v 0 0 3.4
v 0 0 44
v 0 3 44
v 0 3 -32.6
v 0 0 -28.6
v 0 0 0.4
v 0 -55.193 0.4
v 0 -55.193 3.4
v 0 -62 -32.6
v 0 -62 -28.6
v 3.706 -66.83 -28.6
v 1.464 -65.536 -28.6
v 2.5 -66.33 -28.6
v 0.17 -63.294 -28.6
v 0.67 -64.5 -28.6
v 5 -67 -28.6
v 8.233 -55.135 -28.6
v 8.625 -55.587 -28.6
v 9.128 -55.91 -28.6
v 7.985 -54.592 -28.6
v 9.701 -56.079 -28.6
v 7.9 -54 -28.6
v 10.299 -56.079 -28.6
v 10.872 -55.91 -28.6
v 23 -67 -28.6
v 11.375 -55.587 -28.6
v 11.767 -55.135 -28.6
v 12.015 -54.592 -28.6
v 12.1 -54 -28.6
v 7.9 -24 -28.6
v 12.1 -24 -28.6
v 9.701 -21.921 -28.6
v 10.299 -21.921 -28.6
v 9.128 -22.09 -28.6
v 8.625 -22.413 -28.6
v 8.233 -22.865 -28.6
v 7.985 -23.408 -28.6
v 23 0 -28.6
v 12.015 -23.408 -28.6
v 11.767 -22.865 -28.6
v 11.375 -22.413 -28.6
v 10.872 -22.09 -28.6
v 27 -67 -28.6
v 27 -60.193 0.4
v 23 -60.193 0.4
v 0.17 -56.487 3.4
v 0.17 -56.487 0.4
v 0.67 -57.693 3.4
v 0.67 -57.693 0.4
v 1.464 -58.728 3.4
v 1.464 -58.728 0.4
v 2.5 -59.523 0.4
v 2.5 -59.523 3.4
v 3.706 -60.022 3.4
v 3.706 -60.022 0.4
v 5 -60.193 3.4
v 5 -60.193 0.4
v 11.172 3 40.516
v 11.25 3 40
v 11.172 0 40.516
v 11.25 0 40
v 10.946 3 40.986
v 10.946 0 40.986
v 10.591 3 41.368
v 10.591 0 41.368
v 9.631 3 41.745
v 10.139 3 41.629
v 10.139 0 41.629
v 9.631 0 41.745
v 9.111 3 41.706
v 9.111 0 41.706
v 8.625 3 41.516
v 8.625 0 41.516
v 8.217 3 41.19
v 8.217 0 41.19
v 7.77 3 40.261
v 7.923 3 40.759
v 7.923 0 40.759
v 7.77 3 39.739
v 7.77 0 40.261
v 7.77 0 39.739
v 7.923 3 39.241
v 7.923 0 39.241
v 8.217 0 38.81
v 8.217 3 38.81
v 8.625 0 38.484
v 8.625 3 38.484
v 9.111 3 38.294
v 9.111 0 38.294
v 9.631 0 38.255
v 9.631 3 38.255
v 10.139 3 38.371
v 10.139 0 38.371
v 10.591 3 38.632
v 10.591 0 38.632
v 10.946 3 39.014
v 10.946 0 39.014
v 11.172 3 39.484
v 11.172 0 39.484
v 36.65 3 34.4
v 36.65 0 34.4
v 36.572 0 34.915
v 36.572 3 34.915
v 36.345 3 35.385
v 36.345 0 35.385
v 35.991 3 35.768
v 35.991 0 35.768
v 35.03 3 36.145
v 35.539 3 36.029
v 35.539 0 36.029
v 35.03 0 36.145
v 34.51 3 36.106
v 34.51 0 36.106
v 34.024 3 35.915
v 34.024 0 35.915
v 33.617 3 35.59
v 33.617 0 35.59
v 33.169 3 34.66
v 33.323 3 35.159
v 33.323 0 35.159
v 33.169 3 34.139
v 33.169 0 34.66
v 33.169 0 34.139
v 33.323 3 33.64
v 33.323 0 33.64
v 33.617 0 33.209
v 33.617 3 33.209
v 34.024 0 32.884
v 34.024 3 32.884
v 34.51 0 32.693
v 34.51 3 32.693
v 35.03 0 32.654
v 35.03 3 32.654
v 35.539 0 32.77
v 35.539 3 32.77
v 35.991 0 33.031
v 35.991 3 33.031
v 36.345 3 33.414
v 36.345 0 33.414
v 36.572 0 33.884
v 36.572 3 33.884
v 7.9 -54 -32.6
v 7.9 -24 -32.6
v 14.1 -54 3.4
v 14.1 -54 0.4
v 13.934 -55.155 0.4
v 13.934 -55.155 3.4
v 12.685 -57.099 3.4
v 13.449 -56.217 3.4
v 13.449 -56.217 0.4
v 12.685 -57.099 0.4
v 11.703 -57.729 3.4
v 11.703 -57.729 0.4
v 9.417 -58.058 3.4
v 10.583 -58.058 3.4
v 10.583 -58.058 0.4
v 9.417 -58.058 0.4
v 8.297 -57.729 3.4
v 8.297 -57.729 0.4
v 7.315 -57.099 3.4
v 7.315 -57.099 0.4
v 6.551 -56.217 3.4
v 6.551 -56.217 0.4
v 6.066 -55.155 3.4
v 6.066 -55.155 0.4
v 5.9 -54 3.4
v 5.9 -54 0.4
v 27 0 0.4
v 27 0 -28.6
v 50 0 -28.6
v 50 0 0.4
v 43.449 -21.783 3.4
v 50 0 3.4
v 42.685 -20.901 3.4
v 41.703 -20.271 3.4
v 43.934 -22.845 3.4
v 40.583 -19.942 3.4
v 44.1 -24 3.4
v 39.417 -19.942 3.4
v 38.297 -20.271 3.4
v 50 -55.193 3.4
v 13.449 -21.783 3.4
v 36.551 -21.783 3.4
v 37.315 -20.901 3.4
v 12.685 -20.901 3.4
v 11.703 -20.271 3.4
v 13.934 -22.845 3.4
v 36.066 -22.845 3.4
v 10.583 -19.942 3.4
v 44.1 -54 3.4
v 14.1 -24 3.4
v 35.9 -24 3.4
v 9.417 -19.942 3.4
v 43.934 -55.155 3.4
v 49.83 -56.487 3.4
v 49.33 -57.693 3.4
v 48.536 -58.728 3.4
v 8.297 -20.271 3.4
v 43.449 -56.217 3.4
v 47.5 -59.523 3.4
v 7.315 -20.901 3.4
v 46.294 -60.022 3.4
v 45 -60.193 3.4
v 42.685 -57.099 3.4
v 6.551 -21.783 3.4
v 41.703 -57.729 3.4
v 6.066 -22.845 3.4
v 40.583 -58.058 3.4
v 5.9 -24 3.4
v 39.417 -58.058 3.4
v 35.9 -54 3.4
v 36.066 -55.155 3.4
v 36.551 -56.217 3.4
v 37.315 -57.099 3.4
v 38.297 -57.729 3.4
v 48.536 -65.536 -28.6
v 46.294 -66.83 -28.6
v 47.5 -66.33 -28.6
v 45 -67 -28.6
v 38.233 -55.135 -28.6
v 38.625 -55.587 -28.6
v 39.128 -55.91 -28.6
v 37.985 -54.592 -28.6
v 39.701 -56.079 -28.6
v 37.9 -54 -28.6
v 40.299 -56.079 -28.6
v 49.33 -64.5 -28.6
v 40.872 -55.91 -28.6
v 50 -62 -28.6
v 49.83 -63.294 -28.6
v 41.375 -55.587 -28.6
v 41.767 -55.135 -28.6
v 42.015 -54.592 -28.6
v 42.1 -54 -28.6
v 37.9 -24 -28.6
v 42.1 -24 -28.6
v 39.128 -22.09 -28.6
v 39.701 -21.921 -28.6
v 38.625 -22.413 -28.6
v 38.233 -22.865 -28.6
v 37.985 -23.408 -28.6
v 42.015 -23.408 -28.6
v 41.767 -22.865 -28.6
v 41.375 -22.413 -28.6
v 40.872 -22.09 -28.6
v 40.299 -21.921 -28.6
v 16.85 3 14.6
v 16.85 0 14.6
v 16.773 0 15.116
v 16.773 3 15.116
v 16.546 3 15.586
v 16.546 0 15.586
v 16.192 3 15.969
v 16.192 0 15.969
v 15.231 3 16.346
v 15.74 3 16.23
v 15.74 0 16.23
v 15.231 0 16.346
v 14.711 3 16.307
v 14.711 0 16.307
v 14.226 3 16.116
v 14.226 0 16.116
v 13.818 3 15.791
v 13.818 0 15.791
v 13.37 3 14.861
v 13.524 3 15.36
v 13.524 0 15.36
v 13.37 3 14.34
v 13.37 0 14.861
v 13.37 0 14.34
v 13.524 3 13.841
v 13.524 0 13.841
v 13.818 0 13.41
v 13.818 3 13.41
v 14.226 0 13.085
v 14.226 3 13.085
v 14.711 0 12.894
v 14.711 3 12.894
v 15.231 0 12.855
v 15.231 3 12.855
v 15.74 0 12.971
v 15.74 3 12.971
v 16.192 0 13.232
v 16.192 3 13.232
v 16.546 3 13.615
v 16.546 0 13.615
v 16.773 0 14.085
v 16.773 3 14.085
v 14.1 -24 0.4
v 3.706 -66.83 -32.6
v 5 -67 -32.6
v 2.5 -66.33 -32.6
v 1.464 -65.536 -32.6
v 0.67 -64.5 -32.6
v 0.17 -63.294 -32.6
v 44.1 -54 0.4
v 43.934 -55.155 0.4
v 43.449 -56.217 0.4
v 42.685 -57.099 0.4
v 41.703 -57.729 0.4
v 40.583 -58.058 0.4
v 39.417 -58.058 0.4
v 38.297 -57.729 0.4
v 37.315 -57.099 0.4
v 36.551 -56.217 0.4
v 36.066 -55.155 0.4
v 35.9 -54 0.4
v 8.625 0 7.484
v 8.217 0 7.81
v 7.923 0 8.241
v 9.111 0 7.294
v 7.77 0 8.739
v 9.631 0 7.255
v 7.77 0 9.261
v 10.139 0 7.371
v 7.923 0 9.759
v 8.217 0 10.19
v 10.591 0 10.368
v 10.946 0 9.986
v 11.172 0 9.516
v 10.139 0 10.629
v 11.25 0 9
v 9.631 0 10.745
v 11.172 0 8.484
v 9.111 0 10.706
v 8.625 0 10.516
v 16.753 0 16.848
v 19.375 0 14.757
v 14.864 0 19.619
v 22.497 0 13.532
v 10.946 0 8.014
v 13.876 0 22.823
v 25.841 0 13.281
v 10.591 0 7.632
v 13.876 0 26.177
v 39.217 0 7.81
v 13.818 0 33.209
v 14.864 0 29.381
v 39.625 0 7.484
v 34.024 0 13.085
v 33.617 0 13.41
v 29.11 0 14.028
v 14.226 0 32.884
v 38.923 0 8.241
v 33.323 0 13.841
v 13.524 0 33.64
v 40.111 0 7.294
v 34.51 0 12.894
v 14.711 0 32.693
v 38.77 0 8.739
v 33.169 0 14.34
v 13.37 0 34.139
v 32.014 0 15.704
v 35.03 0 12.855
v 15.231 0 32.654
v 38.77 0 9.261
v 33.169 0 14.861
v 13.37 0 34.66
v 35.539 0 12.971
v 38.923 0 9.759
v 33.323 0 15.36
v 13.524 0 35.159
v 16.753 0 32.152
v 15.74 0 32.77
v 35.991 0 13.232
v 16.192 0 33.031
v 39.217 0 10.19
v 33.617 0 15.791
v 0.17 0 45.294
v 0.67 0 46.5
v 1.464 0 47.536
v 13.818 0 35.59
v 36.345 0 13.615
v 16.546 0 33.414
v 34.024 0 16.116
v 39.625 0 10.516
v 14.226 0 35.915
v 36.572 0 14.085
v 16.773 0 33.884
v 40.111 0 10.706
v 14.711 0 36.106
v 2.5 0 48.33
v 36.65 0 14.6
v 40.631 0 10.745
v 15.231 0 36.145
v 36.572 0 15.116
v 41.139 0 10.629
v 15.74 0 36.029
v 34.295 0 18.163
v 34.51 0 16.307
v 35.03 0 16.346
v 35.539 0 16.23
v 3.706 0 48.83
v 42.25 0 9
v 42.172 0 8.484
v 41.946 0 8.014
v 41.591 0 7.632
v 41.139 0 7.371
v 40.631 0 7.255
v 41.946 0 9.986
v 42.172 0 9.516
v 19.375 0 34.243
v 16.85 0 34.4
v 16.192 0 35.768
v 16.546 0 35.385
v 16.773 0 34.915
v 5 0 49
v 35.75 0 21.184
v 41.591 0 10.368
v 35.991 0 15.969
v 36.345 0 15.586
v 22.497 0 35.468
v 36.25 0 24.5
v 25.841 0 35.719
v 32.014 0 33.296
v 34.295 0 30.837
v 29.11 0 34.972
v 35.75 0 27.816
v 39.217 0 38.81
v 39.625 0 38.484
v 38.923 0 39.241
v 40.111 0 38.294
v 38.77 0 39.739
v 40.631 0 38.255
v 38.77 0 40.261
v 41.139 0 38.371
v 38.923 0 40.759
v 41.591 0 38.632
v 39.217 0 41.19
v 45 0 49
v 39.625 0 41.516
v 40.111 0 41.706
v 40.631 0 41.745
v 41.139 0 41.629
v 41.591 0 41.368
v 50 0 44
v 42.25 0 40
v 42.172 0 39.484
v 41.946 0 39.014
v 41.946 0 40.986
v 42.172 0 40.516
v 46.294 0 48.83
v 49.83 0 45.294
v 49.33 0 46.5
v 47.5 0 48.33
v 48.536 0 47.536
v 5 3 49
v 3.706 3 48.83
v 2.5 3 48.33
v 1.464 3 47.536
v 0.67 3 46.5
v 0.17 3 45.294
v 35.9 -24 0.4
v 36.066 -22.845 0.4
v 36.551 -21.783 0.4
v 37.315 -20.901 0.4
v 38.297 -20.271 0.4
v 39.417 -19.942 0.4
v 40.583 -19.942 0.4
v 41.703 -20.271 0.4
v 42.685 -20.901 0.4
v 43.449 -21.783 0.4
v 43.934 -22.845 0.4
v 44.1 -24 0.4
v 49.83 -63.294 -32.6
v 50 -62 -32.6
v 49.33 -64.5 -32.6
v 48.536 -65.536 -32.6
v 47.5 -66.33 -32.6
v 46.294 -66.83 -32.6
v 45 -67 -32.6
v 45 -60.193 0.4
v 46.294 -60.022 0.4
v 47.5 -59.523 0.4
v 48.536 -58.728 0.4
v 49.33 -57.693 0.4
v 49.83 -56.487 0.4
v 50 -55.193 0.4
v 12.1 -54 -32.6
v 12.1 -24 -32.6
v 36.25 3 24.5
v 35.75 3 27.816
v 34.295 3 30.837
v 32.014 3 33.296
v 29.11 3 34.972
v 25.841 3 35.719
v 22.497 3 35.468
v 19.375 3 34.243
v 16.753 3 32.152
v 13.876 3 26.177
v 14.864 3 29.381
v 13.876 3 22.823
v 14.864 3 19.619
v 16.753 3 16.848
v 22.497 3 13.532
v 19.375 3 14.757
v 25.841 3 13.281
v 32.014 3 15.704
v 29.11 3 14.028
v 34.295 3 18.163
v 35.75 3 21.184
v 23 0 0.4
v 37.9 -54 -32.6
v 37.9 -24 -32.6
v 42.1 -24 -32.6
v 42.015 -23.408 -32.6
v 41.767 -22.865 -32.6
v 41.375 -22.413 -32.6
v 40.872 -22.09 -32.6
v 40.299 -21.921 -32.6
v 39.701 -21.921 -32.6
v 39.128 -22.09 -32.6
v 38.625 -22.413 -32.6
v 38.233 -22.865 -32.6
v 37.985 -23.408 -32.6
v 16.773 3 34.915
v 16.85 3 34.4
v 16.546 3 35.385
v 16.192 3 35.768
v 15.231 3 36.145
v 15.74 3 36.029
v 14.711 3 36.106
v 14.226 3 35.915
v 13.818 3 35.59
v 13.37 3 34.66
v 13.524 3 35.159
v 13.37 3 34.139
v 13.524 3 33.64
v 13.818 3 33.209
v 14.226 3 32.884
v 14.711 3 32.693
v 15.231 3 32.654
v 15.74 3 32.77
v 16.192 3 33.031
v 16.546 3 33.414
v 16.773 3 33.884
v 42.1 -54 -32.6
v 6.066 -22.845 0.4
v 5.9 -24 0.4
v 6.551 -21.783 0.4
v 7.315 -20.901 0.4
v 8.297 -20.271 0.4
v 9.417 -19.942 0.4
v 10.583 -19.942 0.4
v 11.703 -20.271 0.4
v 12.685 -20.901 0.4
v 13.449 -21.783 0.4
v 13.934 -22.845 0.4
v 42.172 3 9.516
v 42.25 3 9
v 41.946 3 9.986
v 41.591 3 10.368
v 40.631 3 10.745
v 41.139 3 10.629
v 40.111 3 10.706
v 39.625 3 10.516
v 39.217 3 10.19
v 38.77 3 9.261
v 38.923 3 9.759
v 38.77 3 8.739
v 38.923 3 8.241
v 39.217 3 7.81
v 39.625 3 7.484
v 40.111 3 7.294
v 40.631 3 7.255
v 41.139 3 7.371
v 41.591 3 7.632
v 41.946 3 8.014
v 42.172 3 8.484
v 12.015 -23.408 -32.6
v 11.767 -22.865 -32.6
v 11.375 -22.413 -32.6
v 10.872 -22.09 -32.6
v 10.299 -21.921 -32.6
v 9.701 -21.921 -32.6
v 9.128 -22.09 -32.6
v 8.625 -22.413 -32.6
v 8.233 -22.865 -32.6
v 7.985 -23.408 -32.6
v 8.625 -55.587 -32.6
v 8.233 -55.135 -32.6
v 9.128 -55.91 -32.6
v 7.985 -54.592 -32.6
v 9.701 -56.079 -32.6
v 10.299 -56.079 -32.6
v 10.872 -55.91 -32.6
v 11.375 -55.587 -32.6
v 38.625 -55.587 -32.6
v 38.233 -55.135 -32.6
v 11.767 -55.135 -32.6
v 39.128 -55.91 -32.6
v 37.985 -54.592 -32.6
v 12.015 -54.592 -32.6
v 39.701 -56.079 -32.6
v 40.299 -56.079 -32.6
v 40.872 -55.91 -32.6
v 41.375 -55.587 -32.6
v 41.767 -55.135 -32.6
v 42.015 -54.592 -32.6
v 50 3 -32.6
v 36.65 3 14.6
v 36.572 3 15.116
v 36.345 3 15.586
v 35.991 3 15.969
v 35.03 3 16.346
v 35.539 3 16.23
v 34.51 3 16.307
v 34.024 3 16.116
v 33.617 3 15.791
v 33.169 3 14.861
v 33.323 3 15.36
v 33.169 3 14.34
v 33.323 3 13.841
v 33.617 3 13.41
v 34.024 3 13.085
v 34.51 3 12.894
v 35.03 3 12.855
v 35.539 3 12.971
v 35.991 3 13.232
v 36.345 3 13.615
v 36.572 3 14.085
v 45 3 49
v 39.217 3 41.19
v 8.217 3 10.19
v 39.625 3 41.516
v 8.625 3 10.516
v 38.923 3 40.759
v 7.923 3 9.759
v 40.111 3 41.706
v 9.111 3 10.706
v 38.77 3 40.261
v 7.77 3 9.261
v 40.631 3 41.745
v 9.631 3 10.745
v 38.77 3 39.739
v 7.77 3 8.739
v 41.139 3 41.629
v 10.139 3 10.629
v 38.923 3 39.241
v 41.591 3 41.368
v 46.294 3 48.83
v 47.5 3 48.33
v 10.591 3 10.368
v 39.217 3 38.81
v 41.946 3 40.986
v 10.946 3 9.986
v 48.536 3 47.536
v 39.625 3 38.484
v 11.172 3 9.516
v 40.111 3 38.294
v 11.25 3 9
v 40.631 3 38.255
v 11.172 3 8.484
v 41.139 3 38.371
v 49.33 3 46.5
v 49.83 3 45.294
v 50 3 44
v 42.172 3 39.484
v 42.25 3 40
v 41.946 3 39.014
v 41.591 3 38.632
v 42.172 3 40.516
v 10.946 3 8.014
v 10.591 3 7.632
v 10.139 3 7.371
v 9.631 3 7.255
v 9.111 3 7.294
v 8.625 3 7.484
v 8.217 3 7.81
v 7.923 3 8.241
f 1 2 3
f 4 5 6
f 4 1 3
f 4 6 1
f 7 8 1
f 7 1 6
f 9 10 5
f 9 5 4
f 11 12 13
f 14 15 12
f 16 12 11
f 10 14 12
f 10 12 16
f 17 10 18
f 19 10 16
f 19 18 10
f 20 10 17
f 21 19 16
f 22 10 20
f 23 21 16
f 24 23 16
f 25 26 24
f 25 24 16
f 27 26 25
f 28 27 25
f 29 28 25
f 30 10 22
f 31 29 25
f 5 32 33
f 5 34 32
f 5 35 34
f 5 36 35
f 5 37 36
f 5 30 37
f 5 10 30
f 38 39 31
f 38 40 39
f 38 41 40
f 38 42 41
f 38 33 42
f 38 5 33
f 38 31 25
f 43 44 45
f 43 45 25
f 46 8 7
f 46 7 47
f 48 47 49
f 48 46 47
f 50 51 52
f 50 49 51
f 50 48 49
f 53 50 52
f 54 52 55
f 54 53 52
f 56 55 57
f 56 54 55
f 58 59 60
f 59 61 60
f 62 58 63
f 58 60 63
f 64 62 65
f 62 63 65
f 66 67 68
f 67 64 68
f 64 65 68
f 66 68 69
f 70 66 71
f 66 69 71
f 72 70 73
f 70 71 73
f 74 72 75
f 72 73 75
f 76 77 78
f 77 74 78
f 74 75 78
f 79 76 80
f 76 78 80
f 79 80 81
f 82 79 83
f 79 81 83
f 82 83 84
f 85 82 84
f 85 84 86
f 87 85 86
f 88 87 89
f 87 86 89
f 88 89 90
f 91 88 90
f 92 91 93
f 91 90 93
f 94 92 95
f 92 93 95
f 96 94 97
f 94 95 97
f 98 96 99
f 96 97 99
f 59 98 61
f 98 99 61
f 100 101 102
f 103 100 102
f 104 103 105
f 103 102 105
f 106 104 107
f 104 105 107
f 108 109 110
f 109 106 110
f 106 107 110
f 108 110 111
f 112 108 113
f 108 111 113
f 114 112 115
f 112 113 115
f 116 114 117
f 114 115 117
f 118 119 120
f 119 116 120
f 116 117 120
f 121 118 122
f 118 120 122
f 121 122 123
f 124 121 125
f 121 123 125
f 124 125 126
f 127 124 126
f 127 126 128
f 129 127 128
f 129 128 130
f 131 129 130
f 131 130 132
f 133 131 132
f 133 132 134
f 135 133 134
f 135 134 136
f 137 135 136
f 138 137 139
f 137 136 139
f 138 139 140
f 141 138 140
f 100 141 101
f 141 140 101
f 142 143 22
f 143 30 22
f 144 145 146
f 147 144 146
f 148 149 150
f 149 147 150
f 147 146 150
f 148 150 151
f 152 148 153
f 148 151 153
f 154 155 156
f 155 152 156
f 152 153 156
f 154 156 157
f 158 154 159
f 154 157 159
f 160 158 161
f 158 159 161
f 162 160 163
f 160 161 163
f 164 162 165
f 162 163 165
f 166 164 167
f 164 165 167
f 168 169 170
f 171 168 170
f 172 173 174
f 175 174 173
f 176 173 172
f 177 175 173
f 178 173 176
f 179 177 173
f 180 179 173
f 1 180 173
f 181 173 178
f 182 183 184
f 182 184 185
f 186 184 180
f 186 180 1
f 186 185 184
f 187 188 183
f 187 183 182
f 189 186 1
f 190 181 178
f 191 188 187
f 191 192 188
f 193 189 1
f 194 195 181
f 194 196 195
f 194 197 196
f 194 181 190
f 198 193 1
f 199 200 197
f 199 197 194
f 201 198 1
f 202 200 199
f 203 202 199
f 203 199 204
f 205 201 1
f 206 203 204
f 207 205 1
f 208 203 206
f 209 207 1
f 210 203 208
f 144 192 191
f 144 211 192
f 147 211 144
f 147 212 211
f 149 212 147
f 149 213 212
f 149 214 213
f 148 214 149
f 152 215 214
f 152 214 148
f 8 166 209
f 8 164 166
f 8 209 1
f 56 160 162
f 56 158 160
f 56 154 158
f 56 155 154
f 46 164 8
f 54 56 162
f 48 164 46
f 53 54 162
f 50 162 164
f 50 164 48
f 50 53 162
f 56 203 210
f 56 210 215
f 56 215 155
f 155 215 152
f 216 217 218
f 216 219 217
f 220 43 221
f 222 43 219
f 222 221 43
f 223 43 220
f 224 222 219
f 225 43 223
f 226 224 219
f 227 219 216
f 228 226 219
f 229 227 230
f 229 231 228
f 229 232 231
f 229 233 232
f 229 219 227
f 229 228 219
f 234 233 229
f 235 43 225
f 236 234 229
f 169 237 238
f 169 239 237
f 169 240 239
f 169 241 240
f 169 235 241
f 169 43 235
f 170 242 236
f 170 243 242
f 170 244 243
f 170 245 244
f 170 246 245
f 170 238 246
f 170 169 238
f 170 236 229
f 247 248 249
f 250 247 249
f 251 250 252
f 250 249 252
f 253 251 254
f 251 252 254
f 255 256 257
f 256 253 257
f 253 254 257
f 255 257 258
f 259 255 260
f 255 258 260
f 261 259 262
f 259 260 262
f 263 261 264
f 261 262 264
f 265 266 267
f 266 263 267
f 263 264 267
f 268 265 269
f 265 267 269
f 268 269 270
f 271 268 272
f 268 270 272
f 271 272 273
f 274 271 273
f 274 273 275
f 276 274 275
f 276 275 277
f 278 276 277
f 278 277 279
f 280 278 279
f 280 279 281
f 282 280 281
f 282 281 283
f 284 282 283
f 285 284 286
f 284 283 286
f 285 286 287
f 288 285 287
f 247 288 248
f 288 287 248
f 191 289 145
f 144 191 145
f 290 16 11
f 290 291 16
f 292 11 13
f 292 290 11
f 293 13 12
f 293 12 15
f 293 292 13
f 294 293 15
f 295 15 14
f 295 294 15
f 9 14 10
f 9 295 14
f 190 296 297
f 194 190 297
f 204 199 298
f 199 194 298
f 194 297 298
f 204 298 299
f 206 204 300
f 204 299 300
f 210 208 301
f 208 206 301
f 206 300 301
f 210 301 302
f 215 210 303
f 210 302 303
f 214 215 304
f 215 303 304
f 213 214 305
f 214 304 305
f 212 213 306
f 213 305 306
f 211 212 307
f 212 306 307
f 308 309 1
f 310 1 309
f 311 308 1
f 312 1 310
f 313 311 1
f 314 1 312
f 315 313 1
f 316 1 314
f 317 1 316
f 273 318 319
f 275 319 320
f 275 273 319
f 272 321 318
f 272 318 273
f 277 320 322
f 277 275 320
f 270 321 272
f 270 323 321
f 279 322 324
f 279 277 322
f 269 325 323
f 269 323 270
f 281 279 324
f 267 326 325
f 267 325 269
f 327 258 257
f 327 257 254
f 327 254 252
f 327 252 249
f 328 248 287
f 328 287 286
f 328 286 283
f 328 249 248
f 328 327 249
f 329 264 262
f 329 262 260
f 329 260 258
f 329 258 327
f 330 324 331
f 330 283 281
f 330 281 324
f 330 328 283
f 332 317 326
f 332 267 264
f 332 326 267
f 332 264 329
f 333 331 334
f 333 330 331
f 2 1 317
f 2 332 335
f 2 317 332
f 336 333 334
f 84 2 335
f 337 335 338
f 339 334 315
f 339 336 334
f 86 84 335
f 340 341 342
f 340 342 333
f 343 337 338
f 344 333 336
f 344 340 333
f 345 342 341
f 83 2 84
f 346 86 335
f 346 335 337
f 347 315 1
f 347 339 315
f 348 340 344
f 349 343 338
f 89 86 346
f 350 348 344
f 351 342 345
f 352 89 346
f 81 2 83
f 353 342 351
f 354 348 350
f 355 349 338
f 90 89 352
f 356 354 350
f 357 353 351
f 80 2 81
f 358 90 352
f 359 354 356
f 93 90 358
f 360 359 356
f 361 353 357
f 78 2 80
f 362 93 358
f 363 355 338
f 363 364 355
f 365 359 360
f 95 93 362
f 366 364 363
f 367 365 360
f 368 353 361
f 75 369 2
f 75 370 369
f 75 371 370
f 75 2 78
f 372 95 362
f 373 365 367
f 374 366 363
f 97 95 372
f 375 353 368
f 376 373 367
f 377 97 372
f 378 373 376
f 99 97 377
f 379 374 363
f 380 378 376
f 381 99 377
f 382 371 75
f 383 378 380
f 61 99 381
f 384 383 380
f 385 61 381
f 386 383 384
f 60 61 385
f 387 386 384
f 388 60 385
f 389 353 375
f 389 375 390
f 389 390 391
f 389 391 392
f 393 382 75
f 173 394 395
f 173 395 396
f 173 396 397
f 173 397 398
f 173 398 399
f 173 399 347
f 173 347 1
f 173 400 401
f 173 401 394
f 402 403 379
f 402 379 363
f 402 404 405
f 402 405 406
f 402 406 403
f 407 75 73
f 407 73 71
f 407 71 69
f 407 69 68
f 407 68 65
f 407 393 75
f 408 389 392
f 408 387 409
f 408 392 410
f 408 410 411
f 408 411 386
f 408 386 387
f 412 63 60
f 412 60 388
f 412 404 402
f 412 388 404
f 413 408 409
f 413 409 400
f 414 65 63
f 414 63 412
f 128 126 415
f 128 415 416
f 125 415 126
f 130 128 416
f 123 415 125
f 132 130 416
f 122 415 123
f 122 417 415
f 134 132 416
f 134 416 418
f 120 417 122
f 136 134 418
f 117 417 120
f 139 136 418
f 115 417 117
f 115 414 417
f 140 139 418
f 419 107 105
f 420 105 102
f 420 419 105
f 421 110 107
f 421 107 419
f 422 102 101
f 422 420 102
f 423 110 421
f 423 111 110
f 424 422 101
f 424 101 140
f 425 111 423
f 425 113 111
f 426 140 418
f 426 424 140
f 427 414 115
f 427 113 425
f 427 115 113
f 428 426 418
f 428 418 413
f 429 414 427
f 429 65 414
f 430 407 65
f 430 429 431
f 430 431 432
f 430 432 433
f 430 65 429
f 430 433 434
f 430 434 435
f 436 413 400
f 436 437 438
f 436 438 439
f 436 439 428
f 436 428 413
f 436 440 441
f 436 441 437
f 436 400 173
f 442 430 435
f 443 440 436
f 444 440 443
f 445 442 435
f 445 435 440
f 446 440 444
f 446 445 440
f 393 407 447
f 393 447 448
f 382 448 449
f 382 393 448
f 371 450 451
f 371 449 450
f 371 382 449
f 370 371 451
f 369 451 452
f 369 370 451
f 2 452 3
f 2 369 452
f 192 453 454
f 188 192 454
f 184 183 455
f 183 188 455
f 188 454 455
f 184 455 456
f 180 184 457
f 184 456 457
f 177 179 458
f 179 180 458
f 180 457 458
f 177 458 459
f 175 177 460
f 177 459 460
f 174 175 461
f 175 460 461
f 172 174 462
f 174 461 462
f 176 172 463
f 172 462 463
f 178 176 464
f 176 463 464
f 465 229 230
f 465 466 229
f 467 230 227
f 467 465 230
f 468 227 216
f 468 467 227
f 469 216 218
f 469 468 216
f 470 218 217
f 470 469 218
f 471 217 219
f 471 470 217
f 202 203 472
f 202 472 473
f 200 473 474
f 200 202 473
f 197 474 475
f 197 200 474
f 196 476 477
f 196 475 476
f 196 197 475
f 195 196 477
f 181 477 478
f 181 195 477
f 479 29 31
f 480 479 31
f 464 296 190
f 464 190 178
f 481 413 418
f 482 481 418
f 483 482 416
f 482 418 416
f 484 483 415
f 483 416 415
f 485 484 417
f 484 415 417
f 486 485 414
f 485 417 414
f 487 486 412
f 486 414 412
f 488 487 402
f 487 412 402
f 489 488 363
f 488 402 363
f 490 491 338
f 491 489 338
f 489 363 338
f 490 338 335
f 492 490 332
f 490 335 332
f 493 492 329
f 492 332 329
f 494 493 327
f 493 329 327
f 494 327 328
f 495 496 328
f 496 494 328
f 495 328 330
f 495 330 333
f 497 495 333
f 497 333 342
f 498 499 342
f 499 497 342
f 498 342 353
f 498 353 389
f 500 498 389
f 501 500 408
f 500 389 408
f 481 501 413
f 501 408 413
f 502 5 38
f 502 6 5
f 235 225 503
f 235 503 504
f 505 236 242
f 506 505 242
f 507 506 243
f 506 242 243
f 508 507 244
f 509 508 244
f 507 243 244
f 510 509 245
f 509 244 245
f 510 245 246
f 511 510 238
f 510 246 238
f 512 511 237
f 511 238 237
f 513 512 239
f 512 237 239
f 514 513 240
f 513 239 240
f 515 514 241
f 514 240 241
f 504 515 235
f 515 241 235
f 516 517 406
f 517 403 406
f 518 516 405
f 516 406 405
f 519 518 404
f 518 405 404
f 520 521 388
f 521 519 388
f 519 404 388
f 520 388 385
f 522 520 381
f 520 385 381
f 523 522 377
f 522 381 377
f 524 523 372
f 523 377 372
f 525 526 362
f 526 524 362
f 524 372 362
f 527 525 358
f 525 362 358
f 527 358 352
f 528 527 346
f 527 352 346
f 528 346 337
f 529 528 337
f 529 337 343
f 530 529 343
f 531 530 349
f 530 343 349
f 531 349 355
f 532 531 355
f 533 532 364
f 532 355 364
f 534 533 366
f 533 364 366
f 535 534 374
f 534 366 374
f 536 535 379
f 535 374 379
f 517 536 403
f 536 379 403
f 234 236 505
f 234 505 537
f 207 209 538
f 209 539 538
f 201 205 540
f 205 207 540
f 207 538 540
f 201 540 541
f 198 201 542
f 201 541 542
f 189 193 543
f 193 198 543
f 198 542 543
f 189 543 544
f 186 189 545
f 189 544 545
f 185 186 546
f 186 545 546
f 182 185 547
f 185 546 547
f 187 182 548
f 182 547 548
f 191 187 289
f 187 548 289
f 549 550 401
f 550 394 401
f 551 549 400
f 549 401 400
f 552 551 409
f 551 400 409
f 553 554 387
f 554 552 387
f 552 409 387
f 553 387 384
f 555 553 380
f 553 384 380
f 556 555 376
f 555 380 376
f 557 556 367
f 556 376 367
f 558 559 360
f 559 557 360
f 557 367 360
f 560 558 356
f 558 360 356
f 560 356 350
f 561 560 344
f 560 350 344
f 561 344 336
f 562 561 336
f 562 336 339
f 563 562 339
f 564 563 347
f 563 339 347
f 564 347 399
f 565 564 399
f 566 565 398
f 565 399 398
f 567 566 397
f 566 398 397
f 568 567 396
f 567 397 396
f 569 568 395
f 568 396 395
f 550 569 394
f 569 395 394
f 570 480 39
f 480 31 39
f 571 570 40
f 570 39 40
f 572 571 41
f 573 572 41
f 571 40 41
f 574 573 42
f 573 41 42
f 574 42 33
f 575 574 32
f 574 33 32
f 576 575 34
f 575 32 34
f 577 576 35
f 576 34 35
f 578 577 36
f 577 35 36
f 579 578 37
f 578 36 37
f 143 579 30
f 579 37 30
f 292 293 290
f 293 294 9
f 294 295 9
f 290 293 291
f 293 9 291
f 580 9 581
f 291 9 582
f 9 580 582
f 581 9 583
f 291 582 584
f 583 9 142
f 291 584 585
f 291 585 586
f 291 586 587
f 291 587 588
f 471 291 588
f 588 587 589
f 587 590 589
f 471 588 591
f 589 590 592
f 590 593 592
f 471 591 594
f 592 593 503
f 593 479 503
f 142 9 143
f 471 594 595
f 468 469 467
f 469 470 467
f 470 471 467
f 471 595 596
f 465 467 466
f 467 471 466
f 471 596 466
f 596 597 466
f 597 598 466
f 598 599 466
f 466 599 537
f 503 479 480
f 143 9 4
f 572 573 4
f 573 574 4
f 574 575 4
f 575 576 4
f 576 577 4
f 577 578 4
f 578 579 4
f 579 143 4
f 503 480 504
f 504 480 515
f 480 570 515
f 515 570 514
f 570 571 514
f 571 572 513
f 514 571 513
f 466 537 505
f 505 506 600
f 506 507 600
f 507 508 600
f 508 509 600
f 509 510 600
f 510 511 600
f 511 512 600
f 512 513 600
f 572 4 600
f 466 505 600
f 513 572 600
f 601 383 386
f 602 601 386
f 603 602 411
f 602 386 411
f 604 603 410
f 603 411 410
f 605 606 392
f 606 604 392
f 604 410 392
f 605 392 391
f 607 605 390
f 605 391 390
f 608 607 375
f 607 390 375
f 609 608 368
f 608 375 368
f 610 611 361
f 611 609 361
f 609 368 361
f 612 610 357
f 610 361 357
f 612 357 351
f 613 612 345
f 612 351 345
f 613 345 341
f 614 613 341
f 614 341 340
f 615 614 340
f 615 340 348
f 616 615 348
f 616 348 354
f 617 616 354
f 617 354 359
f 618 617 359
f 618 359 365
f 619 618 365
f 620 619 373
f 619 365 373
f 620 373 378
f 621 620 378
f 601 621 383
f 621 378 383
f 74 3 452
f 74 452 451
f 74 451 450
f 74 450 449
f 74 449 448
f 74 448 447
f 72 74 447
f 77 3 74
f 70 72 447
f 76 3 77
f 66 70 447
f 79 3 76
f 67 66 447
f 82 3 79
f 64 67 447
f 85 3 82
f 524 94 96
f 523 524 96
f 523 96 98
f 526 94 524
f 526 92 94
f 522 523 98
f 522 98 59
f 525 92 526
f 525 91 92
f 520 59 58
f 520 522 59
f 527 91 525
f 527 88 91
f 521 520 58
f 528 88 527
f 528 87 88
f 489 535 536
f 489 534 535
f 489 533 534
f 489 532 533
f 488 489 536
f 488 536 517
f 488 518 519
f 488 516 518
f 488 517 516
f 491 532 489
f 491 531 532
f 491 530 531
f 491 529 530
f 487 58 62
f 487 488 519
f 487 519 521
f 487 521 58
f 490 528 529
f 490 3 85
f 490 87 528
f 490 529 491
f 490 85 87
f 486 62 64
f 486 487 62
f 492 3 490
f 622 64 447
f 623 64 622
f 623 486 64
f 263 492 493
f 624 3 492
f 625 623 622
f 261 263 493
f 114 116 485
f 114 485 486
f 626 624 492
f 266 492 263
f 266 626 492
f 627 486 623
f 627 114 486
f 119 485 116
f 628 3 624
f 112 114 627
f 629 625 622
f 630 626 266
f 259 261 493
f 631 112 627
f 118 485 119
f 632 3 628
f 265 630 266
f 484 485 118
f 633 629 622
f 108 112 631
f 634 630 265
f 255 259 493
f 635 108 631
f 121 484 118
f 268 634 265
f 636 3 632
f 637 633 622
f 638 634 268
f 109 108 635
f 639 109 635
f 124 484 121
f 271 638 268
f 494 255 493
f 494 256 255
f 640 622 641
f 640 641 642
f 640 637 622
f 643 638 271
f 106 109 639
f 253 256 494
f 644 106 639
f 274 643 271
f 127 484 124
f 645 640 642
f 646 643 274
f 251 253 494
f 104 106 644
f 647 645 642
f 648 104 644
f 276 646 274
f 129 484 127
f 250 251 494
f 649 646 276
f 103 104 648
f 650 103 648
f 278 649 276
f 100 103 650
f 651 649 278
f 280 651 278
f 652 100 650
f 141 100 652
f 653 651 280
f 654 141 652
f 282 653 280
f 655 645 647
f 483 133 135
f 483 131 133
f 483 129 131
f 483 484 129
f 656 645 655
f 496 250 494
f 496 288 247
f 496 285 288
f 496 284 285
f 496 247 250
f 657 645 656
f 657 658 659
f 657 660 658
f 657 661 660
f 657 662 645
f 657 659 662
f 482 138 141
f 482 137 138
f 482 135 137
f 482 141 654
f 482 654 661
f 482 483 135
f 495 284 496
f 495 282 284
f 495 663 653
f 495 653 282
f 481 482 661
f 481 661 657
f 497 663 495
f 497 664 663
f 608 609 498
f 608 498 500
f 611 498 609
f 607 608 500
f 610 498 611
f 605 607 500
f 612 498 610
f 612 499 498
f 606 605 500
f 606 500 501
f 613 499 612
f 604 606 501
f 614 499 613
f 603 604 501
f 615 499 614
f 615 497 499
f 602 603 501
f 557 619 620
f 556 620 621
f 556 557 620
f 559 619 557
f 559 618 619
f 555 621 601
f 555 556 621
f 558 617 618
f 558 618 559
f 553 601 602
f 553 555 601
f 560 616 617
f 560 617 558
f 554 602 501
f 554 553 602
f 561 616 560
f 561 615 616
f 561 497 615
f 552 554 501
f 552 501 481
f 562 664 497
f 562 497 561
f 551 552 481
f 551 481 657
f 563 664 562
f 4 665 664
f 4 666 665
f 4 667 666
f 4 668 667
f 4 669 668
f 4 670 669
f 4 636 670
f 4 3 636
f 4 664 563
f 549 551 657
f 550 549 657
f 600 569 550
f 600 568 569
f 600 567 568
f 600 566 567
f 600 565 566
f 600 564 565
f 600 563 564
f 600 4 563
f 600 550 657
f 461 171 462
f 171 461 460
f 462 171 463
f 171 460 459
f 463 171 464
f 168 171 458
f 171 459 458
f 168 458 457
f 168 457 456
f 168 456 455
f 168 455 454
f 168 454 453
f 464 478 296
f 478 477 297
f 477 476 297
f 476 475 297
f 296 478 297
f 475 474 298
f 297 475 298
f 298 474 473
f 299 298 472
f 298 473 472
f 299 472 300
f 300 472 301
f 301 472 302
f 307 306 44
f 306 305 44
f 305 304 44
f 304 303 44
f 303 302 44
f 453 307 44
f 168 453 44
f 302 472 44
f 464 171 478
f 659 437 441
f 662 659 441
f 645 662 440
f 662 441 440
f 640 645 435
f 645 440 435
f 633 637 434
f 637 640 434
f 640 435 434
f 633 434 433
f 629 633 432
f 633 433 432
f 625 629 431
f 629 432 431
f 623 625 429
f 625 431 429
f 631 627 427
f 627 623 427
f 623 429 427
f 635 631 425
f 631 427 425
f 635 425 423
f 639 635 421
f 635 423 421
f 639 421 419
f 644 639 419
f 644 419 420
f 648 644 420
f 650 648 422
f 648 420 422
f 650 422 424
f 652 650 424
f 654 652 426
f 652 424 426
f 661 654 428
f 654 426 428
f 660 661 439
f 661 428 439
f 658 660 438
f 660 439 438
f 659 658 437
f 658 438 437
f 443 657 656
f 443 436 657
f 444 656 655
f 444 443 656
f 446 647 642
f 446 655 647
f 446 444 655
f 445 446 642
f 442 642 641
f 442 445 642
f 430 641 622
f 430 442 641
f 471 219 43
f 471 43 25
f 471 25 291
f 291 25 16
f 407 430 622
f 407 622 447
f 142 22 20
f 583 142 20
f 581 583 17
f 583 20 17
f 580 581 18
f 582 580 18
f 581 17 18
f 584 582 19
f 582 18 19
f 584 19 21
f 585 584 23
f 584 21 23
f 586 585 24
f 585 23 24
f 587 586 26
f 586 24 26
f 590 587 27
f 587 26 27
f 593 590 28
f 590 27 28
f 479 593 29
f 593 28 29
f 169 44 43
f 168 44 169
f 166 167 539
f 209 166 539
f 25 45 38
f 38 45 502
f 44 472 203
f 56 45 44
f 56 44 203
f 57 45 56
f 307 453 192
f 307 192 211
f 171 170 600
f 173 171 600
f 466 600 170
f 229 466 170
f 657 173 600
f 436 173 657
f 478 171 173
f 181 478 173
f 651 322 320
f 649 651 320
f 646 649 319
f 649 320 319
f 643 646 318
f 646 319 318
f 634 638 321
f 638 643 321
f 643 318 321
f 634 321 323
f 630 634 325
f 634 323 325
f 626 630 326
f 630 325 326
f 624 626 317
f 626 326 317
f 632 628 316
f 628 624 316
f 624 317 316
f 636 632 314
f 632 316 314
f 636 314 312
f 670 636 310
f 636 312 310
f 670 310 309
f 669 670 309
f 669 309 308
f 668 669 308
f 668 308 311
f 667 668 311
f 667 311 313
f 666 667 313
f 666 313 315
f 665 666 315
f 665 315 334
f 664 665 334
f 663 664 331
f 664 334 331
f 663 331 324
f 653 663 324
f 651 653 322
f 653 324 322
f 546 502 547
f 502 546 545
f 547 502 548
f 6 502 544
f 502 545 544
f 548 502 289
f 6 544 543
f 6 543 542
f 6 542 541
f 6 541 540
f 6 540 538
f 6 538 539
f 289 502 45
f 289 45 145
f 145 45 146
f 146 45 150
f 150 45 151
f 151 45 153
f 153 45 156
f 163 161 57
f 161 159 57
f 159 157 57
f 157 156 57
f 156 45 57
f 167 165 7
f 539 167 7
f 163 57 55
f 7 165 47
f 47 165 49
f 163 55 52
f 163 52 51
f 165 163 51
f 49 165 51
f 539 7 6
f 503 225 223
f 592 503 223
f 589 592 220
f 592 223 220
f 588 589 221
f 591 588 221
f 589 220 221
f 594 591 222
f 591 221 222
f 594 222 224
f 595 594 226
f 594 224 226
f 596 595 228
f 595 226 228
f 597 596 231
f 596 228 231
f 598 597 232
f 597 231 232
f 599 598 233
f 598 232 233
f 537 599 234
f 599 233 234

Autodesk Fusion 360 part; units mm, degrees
sketch "Sketch1" plane through (0, 0, 0) normal (0, 1, 0) x (1, 0, 0)
  line L0 (0, 0) -> (50, 0)
  line L1 (50, 0) -> (50, -49)
  line L2 (50, -49) -> (0, -49)
  line L3 (0, -49) -> (0, 0)
  line L4 (0, -24.5) -> (50, -24.5) construction
  line L5 (25, -49) -> (25, 0) construction
  circle A0 centre (25, -24.5) radius 11.25
  circle A1 centre (25, -24.5) radius 14 construction
  line L6 (0, -49) -> (0, -40) construction
  line L7 (0, -40) -> (9.5, -40) construction
  circle A2 centre (9.5, -40) radius 1.75
  line L8 (9.5, -40) -> (25, -24.5) construction
  circle A3 centre (15.1005, -34.3995) radius 1.75
  circle A4 centre (40.5, -40) radius 1.75
  circle A5 centre (34.8995, -34.3995) radius 1.75
  circle A6 centre (40.5, -9) radius 1.75
  circle A7 centre (34.8995, -14.6005) radius 1.75
  circle A8 centre (15.1005, -14.6005) radius 1.75
  circle A9 centre (9.5, -9) radius 1.75
  line L9 (0, -49) -> (5, -49)
  line L10 (5, -49) -> (5, -44) construction
  line L11 (5, -44) -> (0, -44) construction
  line L12 (0, -44) -> (0, -49)
  arc A10 (0, -44) -> (5, -49) centre (5, -44) ccw
  arc A11 (45, -49) -> (50, -44) centre (45, -44) ccw
  dimension "d1" = 50
  dimension "d2" = 49
  dimension "d3" = 22.5
  dimension "d4" = 28
  dimension "d5" = 9
  dimension "d6" = 9.5
  dimension "d7" = 3.5
  dimension "d8" = 3.5
  dimension "d11" = 5
  dimension "d12" = 5
extrude "Extrude2" add sketch "Sketch1" along normal blind 3 contours L0 L1 L2 L3 A10 A11
sketch "Sketch2" plane through (0, 0, 0) normal (0, 0, 1) x (1, 0, 0)
  line L0 (0, 3) -> (50, 3)
  line L1 (50, 3) -> (50, -67)
  line L2 (50, -67) -> (0, -67)
  line L3 (0, -67) -> (0, 3)
  line L4 (25, -67) -> (25, 3) construction
  line L5 (0, -67) -> (10, -67) construction
  line L6 (10, -67) -> (10, -54) construction
  line L7 (10, -54) -> (7.9, -54) construction
  line L8 (7.9, -54) -> (12.1, -54)
  line L9 (12.1, -54) -> (12.1, -24)
  line L10 (12.1, -24) -> (7.9, -24)
  line L11 (7.9, -24) -> (7.9, -54)
  arc A0 (7.9, -54) -> (12.1, -54) centre (10, -54) ccw
  arc A1 (12.1, -24) -> (7.9, -24) centre (10, -24) ccw
  arc A2 (37.9, -54) -> (42.1, -54) centre (40, -54) ccw
  line L12 (37.9, -54) -> (37.9, -24)
  line L13 (42.1, -24) -> (42.1, -54)
  arc A3 (42.1, -24) -> (37.9, -24) centre (40, -24) ccw
  line L14 (0, 0) -> (50, 0)
  point P0 (0, 3)
  dimension "d15" = 70
  dimension "d16" = 10
  dimension "d17" = 13
  dimension "d18" = 2.1
  dimension "d19" = 4.2
  dimension "d20" = 30
extrude "Extrude6" add sketch "Sketch2" against normal blind 32.6
extrude "Extrude7" cut sketch "Sketch2" against normal blind 28.6 contours L1 L2 L3 L14
ref_plane "WorkPlane1" through (25, -32, 5.7) normal (1, 0, 0) x (0, 0, -1)
sketch "Sketch6" plane through (25, -32, 5.7) normal (1, 0, 0) x (0, 1, 0)
  line L0 (32, -34.3) -> (-35, -34.3)
  line L1 (-35, -34.3) -> (-35, -5.3)
  line L2 (-35, -5.3) -> (32, -5.3)
  line L3 (32, -5.3) -> (32, -34.3)
  point P0 (32, -34.3)
  dimension "d48" = 67
  dimension "d49" = 29
sketch "Sketch10" plane through (0, 0, 0) normal (0, -1, 0) x (1, 0, 0)
  circle A0 centre (25, 24.5) radius 11.25
  circle A1 centre (9.5, 40) radius 1.75
  circle A2 centre (40.5, 40) radius 1.75
  circle A3 centre (15.1005, 34.3995) radius 1.75
  circle A4 centre (34.8995, 34.3995) radius 1.75
  circle A5 centre (40.5, 9) radius 1.75
  circle A6 centre (34.8995, 14.6005) radius 1.75
  circle A7 centre (15.1005, 14.6005) radius 1.75
  circle A8 centre (9.5, 9) radius 1.75
  arc A9 (5, 49) -> (0, 44) centre (5, 44) ccw
  line L0 (0, 44) -> (0, -28.6)
  line L1 (0, -28.6) -> (50, -28.6)
  line L2 (50, -28.6) -> (50, 44)
  arc A10 (50, 44) -> (45, 49) centre (45, 44) ccw
  line L3 (45, 49) -> (5, 49)
  line L4 (25, 24.5) -> (25, 3.4) construction
  dimension "d71" = 21.1
extrude "Extrude15" add sketch "Sketch6" along normal blind 2 and the other way blind 2
sketch "Sketch11" plane through (0, 0, 0.4) normal (0, 0, 1) x (-1, 0, 0)
  line L0 (-23, 67) -> (-27, 67)
  line L1 (-27, 67) -> (-27, 0)
  line L2 (-27, 0) -> (-23, 0)
  line L3 (-23, 0) -> (-23, 67)
  line L4 (0, 0) -> (-50, 0)
  line L5 (-50, 0) -> (-50, 60.1926)
  line L6 (-50, 60.1926) -> (0, 60.1926)
  line L7 (0, 60.1926) -> (0, 0)
  line L8 (-50, -3) -> (-50, 67)
  line L9 (-7.9, 24) -> (-5.9, 24)
  line L10 (-5.9, 24) -> (-14.1, 24)
  line L11 (-14.1, 24) -> (-14.1, 54)
  line L12 (-14.1, 54) -> (-5.9, 54)
  line L13 (-5.9, 54) -> (-5.9, 24)
  arc A0 (-5.9, 54) -> (-14.1, 54) centre (-10, 54) ccw
  arc A1 (-14.1, 24) -> (-5.9, 24) centre (-10, 24) ccw
  line L14 (-25, 67) -> (-25, 0)
  line L15 (-25, 60.1926) -> (-25, 53.1429)
  line L16 (-35.9, 24) -> (-35.9, 54)
  line L17 (-44.1, 54) -> (-44.1, 24)
  arc A2 (-35.9, 54) -> (-44.1, 54) centre (-40, 54) ccw
  arc A3 (-44.1, 24) -> (-35.9, 24) centre (-40, 24) ccw
  point P0 (-7.9, 24)
  dimension "d76" = 2
  dimension "d77" = 8.2
extrude "Extrude16" add sketch "Sketch11" along normal blind 3 contours L3 L4 L6 L7 | L2 L3 L4 L6 L14 L15 | L1 L2 L4 L6 L14 L15 | L1 L4 L5 L6 L8
sketch "Sketch12" plane through (27, 0, 0) normal (1, 0, 0) x (0, 1, 0)
  line L0 (0, 0.4) -> (-60.1926, 0.4)
  line L1 (-60.1926, 0.4) -> (-67, 0.4)
  line L2 (-67, 0.4) -> (-67, -28.6)
  line L3 (-67, -28.6) -> (0, -28.6)
  line L4 (0, -28.6) -> (0, 0.4)
  line L5 (-60.1926, 0.4) -> (-67, -28.6)
  line L6 (-67, 0.4) -> (-60.1926, 0.4)
extrude "Extrude17" cut sketch "Sketch12" against normal blind 8 contours L1 L2 L5 L6
fillet "Fillet3" radius 5 4 edges at (0, -60.1926, 1.9) (0, -67, -30.6) (50, -67, -30.6) (50, -60.1926, 1.9)
